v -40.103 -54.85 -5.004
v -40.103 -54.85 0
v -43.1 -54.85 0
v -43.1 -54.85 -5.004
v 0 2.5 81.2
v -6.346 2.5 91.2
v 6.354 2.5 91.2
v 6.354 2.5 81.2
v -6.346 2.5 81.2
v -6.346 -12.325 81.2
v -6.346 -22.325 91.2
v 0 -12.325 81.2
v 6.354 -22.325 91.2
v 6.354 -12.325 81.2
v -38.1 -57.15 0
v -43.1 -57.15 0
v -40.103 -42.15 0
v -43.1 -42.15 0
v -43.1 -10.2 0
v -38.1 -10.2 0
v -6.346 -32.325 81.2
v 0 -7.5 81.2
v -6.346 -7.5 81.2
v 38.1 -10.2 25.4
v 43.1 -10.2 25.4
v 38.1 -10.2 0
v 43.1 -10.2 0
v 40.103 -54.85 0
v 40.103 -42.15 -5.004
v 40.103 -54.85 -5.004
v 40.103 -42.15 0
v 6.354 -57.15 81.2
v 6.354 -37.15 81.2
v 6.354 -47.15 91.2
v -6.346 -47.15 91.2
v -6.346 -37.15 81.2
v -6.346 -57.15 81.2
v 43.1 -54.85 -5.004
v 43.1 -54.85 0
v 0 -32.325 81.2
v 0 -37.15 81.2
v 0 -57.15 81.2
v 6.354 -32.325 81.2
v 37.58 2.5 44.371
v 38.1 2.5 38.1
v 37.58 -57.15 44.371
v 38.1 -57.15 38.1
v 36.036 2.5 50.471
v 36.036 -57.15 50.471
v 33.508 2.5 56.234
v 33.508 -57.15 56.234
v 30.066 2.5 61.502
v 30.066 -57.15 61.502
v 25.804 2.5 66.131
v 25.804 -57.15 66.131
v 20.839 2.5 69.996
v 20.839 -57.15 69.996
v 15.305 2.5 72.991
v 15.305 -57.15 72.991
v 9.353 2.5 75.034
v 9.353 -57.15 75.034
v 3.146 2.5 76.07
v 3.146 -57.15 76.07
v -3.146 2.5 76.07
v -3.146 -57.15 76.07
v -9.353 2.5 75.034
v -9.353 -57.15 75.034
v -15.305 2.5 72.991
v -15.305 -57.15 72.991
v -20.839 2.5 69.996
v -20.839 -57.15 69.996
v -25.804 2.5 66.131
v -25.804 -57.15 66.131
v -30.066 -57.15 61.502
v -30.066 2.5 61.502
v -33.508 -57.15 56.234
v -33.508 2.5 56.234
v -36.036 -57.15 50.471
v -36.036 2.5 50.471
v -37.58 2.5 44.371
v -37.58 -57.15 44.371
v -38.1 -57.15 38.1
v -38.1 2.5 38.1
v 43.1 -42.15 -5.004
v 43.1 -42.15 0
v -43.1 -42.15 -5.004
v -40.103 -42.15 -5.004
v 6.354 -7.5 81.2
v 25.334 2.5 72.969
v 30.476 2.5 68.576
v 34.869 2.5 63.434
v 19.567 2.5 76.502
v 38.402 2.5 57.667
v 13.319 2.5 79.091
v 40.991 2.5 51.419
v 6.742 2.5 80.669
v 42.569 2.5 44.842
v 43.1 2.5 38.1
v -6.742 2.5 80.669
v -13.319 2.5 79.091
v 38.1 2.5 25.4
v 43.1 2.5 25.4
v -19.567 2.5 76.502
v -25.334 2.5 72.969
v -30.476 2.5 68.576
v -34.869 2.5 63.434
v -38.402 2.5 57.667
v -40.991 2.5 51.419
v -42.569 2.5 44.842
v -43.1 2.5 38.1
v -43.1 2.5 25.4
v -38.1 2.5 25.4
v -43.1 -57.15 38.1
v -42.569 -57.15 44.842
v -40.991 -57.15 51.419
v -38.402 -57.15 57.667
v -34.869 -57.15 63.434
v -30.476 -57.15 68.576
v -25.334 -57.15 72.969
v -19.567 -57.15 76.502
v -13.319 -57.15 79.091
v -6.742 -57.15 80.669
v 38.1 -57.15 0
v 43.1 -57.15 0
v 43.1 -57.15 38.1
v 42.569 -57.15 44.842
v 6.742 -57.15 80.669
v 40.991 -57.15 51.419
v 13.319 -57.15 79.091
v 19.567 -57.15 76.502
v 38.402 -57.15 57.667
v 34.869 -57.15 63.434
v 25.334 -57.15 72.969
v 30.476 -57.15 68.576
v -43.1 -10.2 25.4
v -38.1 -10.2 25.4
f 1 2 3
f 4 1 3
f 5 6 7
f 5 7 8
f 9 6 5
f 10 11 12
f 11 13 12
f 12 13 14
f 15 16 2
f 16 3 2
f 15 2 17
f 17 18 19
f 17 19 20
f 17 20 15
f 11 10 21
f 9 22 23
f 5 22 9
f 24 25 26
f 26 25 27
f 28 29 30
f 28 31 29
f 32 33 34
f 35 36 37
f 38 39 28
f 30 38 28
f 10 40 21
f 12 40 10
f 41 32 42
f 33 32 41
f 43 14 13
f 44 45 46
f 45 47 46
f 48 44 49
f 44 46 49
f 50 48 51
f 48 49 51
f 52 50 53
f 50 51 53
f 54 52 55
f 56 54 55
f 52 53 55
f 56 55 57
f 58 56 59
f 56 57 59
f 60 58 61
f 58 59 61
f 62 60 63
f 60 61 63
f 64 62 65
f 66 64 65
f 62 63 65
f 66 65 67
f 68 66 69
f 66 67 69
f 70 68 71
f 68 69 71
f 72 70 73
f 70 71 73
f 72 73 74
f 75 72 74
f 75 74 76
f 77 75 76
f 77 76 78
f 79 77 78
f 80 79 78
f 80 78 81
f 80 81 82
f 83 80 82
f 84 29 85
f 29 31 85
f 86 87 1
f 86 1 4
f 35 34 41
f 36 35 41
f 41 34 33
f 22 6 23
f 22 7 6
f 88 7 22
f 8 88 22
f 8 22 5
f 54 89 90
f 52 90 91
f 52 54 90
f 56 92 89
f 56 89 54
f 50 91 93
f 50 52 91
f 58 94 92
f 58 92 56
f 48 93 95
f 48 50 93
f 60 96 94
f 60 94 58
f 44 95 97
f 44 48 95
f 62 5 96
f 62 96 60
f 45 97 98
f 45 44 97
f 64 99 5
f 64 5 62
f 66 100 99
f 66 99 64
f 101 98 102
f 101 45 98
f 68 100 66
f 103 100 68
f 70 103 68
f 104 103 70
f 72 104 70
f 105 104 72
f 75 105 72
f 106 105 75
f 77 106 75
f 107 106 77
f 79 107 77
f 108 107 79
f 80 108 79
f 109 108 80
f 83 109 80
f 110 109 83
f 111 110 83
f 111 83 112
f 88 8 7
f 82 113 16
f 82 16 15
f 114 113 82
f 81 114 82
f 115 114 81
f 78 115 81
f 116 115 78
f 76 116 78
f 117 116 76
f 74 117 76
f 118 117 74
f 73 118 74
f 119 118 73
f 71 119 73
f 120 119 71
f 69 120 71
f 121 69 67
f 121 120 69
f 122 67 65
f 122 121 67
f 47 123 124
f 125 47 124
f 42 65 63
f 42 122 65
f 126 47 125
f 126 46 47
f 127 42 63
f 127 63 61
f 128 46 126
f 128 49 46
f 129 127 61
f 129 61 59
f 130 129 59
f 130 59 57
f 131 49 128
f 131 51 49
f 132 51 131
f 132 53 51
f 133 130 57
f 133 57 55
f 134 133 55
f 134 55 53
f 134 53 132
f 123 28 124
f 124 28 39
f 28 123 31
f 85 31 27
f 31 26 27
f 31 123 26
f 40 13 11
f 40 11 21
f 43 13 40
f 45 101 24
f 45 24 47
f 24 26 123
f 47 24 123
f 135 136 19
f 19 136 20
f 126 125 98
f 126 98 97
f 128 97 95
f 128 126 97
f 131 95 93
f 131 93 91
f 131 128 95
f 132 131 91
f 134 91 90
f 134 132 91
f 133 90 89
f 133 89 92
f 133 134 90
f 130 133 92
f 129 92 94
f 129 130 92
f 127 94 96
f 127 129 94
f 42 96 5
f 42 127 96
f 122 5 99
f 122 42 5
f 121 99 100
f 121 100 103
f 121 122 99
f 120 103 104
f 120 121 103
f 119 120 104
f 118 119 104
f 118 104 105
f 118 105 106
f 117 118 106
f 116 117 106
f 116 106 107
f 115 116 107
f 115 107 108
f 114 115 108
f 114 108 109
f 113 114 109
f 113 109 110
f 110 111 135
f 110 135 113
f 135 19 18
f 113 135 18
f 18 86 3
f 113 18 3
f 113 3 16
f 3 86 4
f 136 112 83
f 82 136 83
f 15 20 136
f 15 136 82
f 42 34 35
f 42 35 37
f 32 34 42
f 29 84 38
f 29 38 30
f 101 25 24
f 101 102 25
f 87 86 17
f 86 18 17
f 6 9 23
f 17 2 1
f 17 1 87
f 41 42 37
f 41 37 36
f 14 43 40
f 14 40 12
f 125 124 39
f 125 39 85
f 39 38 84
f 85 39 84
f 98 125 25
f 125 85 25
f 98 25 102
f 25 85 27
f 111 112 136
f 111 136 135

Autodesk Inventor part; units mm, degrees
ref_plane "YZ Plane" through (0, 0, 0) normal (1, 0, 0) x (0, 1, 0)
ref_plane "XZ Plane" through (0, 0, 0) normal (0, 1, 0) x (-1, 0, 0)
sketch "Sketch1" plane through (0, 0, 0) normal (0, 0, 1) x (1, 0, 0)
  arc A0 (-38.1, -57.15) -> (38.1, -57.15) centre (0, -57.15) ccw projected
  line L0 (38.1, -57.15) -> (43.1, -57.15) projected
  line L1 (43.1, -57.15) -> (43.1, 62.15) projected
  line L2 (43.1, 62.15) -> (-43.1, 62.15) projected
  line L3 (-43.1, 62.15) -> (-43.1, -57.15) projected
  line L4 (-43.1, -57.15) -> (-38.1, -57.15) projected
  line L5 (14, 57.15) -> (-14, 57.15) projected
  line L6 (14, 57.15) -> (14, 54.15) projected
  line L7 (14, 54.15) -> (-10.002, 54.15) projected
  line L8 (-10.002, 54.15) -> (-10.002, 53.078) projected
  line L9 (-10.002, 53.078) -> (-14, 53.078) projected
  line L10 (-14, 53.078) -> (-14, 57.15) projected
  line L11 (10.16, -7.55) -> (-10.16, -7.55) projected
  line L12 (-10.16, -7.55) -> (-10.16, 9.15) projected
  line L13 (-10.16, 9.15) -> (10.16, 9.15) projected
  line L14 (10.16, 9.15) -> (10.16, -7.55) projected
  circle A1 centre (0, -77.15) radius 5 projected
  line L15 (-19.058, -20.782) -> (-19.058, -16.21) projected
  line L16 (-19.058, -16.21) -> (-17.058, -16.21) projected
  line L17 (-17.058, -16.21) -> (-17.058, -22.782) projected
  line L18 (-17.058, -22.782) -> (-24.598, -22.782) projected
  line L19 (-24.598, -22.782) -> (-24.598, -16.21) projected
  line L20 (-24.598, -16.21) -> (-22.598, -16.21) projected
  line L21 (-22.598, -16.21) -> (-22.598, -20.782) projected
  line L22 (-22.598, -20.782) -> (-19.058, -20.782) projected
  line L23 (-19.058, 7.65) -> (-19.058, 12.222) projected
  line L24 (-19.058, 12.222) -> (-22.598, 12.222) projected
  line L25 (-22.598, 12.222) -> (-22.598, 7.65) projected
  line L26 (-22.598, 7.65) -> (-24.598, 7.65) projected
  line L27 (-24.598, 7.65) -> (-24.598, 14.222) projected
  line L28 (-24.598, 14.222) -> (-17.058, 14.222) projected
  line L29 (-17.058, 14.222) -> (-17.058, 7.65) projected
  line L30 (-17.058, 7.65) -> (-19.058, 7.65) projected
  line L31 (-6.662, 29.218) -> (-6.662, 22.4) projected
  line L32 (-6.662, 22.4) -> (7.275, 22.4) projected
  line L33 (7.275, 22.4) -> (7.275, 19.4) projected
  line L34 (7.275, 19.4) -> (-14.202, 19.4) projected
  line L35 (-14.202, 19.4) -> (-14.202, 29.218) projected
  line L36 (-14.202, 29.218) -> (-12.202, 29.218) projected
  line L37 (-12.202, 29.218) -> (-12.202, 29.221) projected
  line L38 (-12.202, 29.221) -> (-8.662, 29.221) projected
  line L39 (-8.662, 29.221) -> (-8.662, 29.218) projected
  line L40 (-8.662, 29.218) -> (-6.662, 29.218) projected
  line L41 (38.1, -57.15) -> (43.1, -57.15)
  line L42 (43.1, -57.15) -> (43.1, 62.15)
  line L43 (43.1, 62.15) -> (38.1, 62.15)
  line L44 (38.1, 62.15) -> (38.1, -57.15)
  line L45 (-38.1, -57.15) -> (-43.1, -57.15)
  line L46 (-43.1, -57.15) -> (-43.1, 62.15)
  line L47 (-43.1, 62.15) -> (-38.1, 62.15)
  line L48 (-38.1, 62.15) -> (-38.1, -57.15)
  line L49 (-43.1, 62.15) -> (-43.1, 57.15)
  line L50 (-43.1, 57.15) -> (43.1, 57.15)
  line L51 (43.1, 57.15) -> (-43.1, 57.15)
  line L52 (-43.1, 57.15) -> (-43.1, 62.15)
  line L53 (-43.1, 62.15) -> (43.1, 62.15)
  line L54 (43.1, 62.15) -> (43.1, 57.15)
  point P0 (0, 0)
  dimension "d0" = 5
extrude "Extrusion1" add sketch "Sketch1" along normal blind 38.1 contours L4 L3 L50 L48 | L44 L50 L1 L0 | L50 L3 L2 L48 | L48 L2 L44 L50 L5 | L44 L2 L1 L50
sketch "Sketch2" plane through (-43.1, -57.15, 0) normal (0, -1, 0) x (1, 0, 0)
  line L0 (5, 38.1) -> (81.2, 38.1) projected
  arc A0 (81.2, 38.1) -> (5, 38.1) centre (43.1, 38.1) ccw
  line L1 (0, 38.1) -> (5, 38.1) projected
  arc A1 (86.2, 38.1) -> (0, 38.1) centre (43.1, 38.1) ccw
  line L2 (0, 38.1) -> (5, 38.1)
  line L3 (81.2, 38.1) -> (86.2, 38.1) projected
  line L4 (81.2, 38.1) -> (86.2, 38.1)
  point P0 (43.1, 0)
extrude "Extrusion2" add sketch "Sketch2" against normal blind 119.3 contours L1 A1 L3 A0
sketch "Sketch3" plane through (-43.1, 62.15, 0) normal (0, 1, 0) x (1, 0, 0)
  arc A0 (5, -38.1) -> (81.2, -38.1) centre (43.1, -38.1) ccw projected
  line L0 (81.2, -38.1) -> (5, -38.1) projected
  point P0 (43.1, 0)
extrude "Extrusion3" add sketch "Sketch3" against normal blind 5
sketch "Sketch4" plane through (-43.1, 62.15, 0) normal (0, 1, 0) x (1, 0, 0)
  circle A0 centre (43.1, -23.375) radius 3.275 projected
  circle A1 centre (66.45, -4.725) radius 3.275 projected
  point P0 (43.1, 0)
extrude "Extrusion4" cut sketch "Sketch4" against normal blind 5 contours A1
ref_plane "Work Plane1" through (0.0038, -57.15, 0) normal (-1, 0, 0) x (0, 0, 1)
sketch "Sketch5" plane through (0.0038, -57.15, 0) normal (-1, 0, 0) x (0, 0, 1)
  point P0 (0, 57.15)
sketch "Sketch6" plane through (0.0038, -57.15, 0) normal (-1, 0, 0) x (0, 0, 1)
  line L0 (81.2, 0) -> (81.2, 119.3) projected
  line L1 (81.2, 119.3) -> (81.2, 99.3)
  line L2 (81.2, 109.3) -> (91.2, 109.3)
  line L3 (91.2, 109.3) -> (81.2, 119.3)
  line L4 (91.2, 109.3) -> (81.2, 99.3)
  line L5 (91.2, 84.475) -> (81.2, 74.475)
  line L6 (81.2, 84.475) -> (91.2, 84.475)
  line L7 (81.2, 94.475) -> (81.2, 74.475)
  line L8 (91.2, 84.475) -> (81.2, 94.475)
  line L9 (91.2, 59.65) -> (81.2, 49.65)
  line L10 (81.2, 59.65) -> (91.2, 59.65)
  line L11 (81.2, 69.65) -> (81.2, 49.65)
  line L12 (91.2, 59.65) -> (81.2, 69.65)
  line L13 (91.2, 34.825) -> (81.2, 24.825)
  line L14 (81.2, 34.825) -> (91.2, 34.825)
  line L15 (81.2, 44.825) -> (81.2, 24.825)
  line L16 (91.2, 34.825) -> (81.2, 44.825)
  line L17 (91.2, 10) -> (81.2, 0)
  line L18 (81.2, 10) -> (91.2, 10)
  line L19 (81.2, 20) -> (81.2, 0)
  line L20 (91.2, 10) -> (81.2, 20)
  point P0 (0, 57.15)
  dimension "d10" = 20
  dimension "d11" = 10
  dimension "d14" = 24.825
extrude "Extrusion5" add sketch "Sketch6" along normal mid plane 12.7
sketch "Sketch8" plane through (0, 0, 0) normal (0, 0, -1) x (-1, 0, 0)
  line L0 (40.1, 24.05) -> (40.1, 36.75) projected
  line L1 (-40.1, 36.75) -> (-40.1, 24.05) projected
  line L2 (-40.1, -19.05) -> (-40.1, -31.75) projected
  line L3 (43.1, 62.15) -> (43.1, -57.15) projected
  line L4 (40.1, 36.75) -> (43.1, 36.75)
  line L5 (43.1, 36.75) -> (43.1, 24.05)
  line L6 (43.1, 24.05) -> (40.1, 24.05)
  line L7 (40.1, 24.05) -> (40.1, 36.75)
  line L8 (40.1, -31.75) -> (40.1, -19.05)
  line L9 (-43.1, -57.15) -> (-43.1, 62.15) projected
  line L10 (-40.1, 24.05) -> (-43.1, 24.05)
  line L11 (-43.1, 24.05) -> (-43.1, 36.75)
  line L12 (-43.1, 36.75) -> (-40.1, 36.75)
  line L13 (-40.1, 36.75) -> (-40.1, 24.05)
  line L14 (40.1028, -54.85) -> (40.1028, -42.15) projected
  line L15 (-40.1028, -42.15) -> (-40.1028, -54.85) projected
  line L16 (-43.1, -54.85) -> (-40.1028, -54.85)
  line L17 (-40.1028, -54.85) -> (-40.1028, -42.15)
  line L18 (-40.1028, -42.15) -> (-43.1, -42.15)
  line L19 (-43.1, -42.15) -> (-43.1, -54.85)
  line L20 (43.1, 62.15) -> (43.1, -57.15) projected
  line L21 (40.1028, -54.85) -> (43.1, -54.85)
  line L22 (43.1, -54.85) -> (43.1, -42.15)
  line L23 (43.1, -42.15) -> (40.1028, -42.15)
  line L24 (40.1028, -42.15) -> (40.1028, -54.85)
  point P0 (0, 0)
  point P1 (43.1, -31.75)
  point P2 (-43.1, -31.75)
extrude "Extrusion6" add sketch "Sketch8" along normal blind 5.0038
sketch "Sketch9" plane through (0, 0, 0) normal (0, 0, -1) x (-1, 0, 0)
  line L0 (4.278, 59.65) -> (-6.35, 59.65) projected
  line L1 (38.1, 57.15) -> (-38.1, 57.15) projected
  line L2 (4.278, 59.65) -> (-6.35, 59.65)
  line L3 (-6.35, 59.65) -> (-6.35, 57.15)
  line L4 (-6.35, 57.15) -> (4.278, 57.15)
  line L5 (4.278, 57.15) -> (4.278, 59.65)
  point P0 (0, 0)
extrude "Extrusion7" cut sketch "Sketch9" against normal blind 50.8
sketch "Sketch10" plane through (0, 0, 0) normal (0, 0, -1) x (-1, 0, 0)
  line L0 (-6.35, 57.15) -> (-38.1, 57.15) projected
  line L1 (-10.762, 59.65) -> (-10.762, 22.646) projected
  line L2 (-10.762, 57.15) -> (-6.35, 57.15)
  line L3 (-6.35, 57.15) -> (-6.35, 59.65)
  line L4 (-6.35, 59.65) -> (-10.762, 59.65)
  line L5 (-10.762, 59.65) -> (-10.762, 57.15)
  point P0 (0, 0)
extrude "Extrusion8" cut sketch "Sketch10" against normal blind 50.8
sketch "Sketch11" plane through (-43.1, -57.15, 38.1) normal (-1, 0, 0) x (0, 0, 1)
  line L0 (53.1, 59.65) -> (43.1, 49.65) projected
  line L1 (53.1, 59.65) -> (-73.8859, 59.65)
  line L2 (53.1, 59.65) -> (106.3175, 223.2278)
  line L3 (106.3175, 223.2278) -> (-94.7472, 207.4972)
  line L4 (-94.7472, 207.4972) -> (-73.8859, 59.65)
  point P0 (-38.1, 57.15)
extrude "Extrusion9" cut sketch "Sketch11" against normal blind 406.4
sketch "Sketch12" plane through (43.1, -57.15, 38.1) normal (1, 0, 0) x (0, 0, -1)
  line L0 (38.1, 15) -> (38.1, 59.65) projected
  line L1 (0, 59.65) -> (0, 0) projected
  line L2 (38.1, 59.65) -> (0, 59.65)
  line L3 (0, 59.65) -> (0, 46.95)
  line L4 (0, 46.95) -> (38.1, 46.95)
  line L5 (38.1, 46.95) -> (38.1, 59.65)
  point P0 (38.1, 57.15)
  dimension "d29" = 12.7
extrude "Extrusion10" cut sketch "Sketch12" against normal blind 167005
sketch "Sketch13" plane through (-38.1, -10.2, 38.1) normal (0, 0, -1) x (-1, 0, 0)
  line L0 (0, 0) -> (0, 12.7) projected
  line L1 (0, 0) -> (5, 0) projected
  line L2 (5, 12.7) -> (5, 0) projected
  line L3 (0, 12.7) -> (5, 12.7) projected
  line L4 (-76.2, 12.7) -> (-76.2, 0) projected
  line L5 (-81.2, 12.7) -> (-76.2, 12.7) projected
  line L6 (-81.2, 0) -> (-81.2, 12.7) projected
  line L7 (-81.2, 0) -> (-76.2, 0) projected
  point P0 (-38.1, 10.2)
extrude "Extrusion11" add sketch "Sketch13" along normal blind 12.7
properties part number "Skin3"
